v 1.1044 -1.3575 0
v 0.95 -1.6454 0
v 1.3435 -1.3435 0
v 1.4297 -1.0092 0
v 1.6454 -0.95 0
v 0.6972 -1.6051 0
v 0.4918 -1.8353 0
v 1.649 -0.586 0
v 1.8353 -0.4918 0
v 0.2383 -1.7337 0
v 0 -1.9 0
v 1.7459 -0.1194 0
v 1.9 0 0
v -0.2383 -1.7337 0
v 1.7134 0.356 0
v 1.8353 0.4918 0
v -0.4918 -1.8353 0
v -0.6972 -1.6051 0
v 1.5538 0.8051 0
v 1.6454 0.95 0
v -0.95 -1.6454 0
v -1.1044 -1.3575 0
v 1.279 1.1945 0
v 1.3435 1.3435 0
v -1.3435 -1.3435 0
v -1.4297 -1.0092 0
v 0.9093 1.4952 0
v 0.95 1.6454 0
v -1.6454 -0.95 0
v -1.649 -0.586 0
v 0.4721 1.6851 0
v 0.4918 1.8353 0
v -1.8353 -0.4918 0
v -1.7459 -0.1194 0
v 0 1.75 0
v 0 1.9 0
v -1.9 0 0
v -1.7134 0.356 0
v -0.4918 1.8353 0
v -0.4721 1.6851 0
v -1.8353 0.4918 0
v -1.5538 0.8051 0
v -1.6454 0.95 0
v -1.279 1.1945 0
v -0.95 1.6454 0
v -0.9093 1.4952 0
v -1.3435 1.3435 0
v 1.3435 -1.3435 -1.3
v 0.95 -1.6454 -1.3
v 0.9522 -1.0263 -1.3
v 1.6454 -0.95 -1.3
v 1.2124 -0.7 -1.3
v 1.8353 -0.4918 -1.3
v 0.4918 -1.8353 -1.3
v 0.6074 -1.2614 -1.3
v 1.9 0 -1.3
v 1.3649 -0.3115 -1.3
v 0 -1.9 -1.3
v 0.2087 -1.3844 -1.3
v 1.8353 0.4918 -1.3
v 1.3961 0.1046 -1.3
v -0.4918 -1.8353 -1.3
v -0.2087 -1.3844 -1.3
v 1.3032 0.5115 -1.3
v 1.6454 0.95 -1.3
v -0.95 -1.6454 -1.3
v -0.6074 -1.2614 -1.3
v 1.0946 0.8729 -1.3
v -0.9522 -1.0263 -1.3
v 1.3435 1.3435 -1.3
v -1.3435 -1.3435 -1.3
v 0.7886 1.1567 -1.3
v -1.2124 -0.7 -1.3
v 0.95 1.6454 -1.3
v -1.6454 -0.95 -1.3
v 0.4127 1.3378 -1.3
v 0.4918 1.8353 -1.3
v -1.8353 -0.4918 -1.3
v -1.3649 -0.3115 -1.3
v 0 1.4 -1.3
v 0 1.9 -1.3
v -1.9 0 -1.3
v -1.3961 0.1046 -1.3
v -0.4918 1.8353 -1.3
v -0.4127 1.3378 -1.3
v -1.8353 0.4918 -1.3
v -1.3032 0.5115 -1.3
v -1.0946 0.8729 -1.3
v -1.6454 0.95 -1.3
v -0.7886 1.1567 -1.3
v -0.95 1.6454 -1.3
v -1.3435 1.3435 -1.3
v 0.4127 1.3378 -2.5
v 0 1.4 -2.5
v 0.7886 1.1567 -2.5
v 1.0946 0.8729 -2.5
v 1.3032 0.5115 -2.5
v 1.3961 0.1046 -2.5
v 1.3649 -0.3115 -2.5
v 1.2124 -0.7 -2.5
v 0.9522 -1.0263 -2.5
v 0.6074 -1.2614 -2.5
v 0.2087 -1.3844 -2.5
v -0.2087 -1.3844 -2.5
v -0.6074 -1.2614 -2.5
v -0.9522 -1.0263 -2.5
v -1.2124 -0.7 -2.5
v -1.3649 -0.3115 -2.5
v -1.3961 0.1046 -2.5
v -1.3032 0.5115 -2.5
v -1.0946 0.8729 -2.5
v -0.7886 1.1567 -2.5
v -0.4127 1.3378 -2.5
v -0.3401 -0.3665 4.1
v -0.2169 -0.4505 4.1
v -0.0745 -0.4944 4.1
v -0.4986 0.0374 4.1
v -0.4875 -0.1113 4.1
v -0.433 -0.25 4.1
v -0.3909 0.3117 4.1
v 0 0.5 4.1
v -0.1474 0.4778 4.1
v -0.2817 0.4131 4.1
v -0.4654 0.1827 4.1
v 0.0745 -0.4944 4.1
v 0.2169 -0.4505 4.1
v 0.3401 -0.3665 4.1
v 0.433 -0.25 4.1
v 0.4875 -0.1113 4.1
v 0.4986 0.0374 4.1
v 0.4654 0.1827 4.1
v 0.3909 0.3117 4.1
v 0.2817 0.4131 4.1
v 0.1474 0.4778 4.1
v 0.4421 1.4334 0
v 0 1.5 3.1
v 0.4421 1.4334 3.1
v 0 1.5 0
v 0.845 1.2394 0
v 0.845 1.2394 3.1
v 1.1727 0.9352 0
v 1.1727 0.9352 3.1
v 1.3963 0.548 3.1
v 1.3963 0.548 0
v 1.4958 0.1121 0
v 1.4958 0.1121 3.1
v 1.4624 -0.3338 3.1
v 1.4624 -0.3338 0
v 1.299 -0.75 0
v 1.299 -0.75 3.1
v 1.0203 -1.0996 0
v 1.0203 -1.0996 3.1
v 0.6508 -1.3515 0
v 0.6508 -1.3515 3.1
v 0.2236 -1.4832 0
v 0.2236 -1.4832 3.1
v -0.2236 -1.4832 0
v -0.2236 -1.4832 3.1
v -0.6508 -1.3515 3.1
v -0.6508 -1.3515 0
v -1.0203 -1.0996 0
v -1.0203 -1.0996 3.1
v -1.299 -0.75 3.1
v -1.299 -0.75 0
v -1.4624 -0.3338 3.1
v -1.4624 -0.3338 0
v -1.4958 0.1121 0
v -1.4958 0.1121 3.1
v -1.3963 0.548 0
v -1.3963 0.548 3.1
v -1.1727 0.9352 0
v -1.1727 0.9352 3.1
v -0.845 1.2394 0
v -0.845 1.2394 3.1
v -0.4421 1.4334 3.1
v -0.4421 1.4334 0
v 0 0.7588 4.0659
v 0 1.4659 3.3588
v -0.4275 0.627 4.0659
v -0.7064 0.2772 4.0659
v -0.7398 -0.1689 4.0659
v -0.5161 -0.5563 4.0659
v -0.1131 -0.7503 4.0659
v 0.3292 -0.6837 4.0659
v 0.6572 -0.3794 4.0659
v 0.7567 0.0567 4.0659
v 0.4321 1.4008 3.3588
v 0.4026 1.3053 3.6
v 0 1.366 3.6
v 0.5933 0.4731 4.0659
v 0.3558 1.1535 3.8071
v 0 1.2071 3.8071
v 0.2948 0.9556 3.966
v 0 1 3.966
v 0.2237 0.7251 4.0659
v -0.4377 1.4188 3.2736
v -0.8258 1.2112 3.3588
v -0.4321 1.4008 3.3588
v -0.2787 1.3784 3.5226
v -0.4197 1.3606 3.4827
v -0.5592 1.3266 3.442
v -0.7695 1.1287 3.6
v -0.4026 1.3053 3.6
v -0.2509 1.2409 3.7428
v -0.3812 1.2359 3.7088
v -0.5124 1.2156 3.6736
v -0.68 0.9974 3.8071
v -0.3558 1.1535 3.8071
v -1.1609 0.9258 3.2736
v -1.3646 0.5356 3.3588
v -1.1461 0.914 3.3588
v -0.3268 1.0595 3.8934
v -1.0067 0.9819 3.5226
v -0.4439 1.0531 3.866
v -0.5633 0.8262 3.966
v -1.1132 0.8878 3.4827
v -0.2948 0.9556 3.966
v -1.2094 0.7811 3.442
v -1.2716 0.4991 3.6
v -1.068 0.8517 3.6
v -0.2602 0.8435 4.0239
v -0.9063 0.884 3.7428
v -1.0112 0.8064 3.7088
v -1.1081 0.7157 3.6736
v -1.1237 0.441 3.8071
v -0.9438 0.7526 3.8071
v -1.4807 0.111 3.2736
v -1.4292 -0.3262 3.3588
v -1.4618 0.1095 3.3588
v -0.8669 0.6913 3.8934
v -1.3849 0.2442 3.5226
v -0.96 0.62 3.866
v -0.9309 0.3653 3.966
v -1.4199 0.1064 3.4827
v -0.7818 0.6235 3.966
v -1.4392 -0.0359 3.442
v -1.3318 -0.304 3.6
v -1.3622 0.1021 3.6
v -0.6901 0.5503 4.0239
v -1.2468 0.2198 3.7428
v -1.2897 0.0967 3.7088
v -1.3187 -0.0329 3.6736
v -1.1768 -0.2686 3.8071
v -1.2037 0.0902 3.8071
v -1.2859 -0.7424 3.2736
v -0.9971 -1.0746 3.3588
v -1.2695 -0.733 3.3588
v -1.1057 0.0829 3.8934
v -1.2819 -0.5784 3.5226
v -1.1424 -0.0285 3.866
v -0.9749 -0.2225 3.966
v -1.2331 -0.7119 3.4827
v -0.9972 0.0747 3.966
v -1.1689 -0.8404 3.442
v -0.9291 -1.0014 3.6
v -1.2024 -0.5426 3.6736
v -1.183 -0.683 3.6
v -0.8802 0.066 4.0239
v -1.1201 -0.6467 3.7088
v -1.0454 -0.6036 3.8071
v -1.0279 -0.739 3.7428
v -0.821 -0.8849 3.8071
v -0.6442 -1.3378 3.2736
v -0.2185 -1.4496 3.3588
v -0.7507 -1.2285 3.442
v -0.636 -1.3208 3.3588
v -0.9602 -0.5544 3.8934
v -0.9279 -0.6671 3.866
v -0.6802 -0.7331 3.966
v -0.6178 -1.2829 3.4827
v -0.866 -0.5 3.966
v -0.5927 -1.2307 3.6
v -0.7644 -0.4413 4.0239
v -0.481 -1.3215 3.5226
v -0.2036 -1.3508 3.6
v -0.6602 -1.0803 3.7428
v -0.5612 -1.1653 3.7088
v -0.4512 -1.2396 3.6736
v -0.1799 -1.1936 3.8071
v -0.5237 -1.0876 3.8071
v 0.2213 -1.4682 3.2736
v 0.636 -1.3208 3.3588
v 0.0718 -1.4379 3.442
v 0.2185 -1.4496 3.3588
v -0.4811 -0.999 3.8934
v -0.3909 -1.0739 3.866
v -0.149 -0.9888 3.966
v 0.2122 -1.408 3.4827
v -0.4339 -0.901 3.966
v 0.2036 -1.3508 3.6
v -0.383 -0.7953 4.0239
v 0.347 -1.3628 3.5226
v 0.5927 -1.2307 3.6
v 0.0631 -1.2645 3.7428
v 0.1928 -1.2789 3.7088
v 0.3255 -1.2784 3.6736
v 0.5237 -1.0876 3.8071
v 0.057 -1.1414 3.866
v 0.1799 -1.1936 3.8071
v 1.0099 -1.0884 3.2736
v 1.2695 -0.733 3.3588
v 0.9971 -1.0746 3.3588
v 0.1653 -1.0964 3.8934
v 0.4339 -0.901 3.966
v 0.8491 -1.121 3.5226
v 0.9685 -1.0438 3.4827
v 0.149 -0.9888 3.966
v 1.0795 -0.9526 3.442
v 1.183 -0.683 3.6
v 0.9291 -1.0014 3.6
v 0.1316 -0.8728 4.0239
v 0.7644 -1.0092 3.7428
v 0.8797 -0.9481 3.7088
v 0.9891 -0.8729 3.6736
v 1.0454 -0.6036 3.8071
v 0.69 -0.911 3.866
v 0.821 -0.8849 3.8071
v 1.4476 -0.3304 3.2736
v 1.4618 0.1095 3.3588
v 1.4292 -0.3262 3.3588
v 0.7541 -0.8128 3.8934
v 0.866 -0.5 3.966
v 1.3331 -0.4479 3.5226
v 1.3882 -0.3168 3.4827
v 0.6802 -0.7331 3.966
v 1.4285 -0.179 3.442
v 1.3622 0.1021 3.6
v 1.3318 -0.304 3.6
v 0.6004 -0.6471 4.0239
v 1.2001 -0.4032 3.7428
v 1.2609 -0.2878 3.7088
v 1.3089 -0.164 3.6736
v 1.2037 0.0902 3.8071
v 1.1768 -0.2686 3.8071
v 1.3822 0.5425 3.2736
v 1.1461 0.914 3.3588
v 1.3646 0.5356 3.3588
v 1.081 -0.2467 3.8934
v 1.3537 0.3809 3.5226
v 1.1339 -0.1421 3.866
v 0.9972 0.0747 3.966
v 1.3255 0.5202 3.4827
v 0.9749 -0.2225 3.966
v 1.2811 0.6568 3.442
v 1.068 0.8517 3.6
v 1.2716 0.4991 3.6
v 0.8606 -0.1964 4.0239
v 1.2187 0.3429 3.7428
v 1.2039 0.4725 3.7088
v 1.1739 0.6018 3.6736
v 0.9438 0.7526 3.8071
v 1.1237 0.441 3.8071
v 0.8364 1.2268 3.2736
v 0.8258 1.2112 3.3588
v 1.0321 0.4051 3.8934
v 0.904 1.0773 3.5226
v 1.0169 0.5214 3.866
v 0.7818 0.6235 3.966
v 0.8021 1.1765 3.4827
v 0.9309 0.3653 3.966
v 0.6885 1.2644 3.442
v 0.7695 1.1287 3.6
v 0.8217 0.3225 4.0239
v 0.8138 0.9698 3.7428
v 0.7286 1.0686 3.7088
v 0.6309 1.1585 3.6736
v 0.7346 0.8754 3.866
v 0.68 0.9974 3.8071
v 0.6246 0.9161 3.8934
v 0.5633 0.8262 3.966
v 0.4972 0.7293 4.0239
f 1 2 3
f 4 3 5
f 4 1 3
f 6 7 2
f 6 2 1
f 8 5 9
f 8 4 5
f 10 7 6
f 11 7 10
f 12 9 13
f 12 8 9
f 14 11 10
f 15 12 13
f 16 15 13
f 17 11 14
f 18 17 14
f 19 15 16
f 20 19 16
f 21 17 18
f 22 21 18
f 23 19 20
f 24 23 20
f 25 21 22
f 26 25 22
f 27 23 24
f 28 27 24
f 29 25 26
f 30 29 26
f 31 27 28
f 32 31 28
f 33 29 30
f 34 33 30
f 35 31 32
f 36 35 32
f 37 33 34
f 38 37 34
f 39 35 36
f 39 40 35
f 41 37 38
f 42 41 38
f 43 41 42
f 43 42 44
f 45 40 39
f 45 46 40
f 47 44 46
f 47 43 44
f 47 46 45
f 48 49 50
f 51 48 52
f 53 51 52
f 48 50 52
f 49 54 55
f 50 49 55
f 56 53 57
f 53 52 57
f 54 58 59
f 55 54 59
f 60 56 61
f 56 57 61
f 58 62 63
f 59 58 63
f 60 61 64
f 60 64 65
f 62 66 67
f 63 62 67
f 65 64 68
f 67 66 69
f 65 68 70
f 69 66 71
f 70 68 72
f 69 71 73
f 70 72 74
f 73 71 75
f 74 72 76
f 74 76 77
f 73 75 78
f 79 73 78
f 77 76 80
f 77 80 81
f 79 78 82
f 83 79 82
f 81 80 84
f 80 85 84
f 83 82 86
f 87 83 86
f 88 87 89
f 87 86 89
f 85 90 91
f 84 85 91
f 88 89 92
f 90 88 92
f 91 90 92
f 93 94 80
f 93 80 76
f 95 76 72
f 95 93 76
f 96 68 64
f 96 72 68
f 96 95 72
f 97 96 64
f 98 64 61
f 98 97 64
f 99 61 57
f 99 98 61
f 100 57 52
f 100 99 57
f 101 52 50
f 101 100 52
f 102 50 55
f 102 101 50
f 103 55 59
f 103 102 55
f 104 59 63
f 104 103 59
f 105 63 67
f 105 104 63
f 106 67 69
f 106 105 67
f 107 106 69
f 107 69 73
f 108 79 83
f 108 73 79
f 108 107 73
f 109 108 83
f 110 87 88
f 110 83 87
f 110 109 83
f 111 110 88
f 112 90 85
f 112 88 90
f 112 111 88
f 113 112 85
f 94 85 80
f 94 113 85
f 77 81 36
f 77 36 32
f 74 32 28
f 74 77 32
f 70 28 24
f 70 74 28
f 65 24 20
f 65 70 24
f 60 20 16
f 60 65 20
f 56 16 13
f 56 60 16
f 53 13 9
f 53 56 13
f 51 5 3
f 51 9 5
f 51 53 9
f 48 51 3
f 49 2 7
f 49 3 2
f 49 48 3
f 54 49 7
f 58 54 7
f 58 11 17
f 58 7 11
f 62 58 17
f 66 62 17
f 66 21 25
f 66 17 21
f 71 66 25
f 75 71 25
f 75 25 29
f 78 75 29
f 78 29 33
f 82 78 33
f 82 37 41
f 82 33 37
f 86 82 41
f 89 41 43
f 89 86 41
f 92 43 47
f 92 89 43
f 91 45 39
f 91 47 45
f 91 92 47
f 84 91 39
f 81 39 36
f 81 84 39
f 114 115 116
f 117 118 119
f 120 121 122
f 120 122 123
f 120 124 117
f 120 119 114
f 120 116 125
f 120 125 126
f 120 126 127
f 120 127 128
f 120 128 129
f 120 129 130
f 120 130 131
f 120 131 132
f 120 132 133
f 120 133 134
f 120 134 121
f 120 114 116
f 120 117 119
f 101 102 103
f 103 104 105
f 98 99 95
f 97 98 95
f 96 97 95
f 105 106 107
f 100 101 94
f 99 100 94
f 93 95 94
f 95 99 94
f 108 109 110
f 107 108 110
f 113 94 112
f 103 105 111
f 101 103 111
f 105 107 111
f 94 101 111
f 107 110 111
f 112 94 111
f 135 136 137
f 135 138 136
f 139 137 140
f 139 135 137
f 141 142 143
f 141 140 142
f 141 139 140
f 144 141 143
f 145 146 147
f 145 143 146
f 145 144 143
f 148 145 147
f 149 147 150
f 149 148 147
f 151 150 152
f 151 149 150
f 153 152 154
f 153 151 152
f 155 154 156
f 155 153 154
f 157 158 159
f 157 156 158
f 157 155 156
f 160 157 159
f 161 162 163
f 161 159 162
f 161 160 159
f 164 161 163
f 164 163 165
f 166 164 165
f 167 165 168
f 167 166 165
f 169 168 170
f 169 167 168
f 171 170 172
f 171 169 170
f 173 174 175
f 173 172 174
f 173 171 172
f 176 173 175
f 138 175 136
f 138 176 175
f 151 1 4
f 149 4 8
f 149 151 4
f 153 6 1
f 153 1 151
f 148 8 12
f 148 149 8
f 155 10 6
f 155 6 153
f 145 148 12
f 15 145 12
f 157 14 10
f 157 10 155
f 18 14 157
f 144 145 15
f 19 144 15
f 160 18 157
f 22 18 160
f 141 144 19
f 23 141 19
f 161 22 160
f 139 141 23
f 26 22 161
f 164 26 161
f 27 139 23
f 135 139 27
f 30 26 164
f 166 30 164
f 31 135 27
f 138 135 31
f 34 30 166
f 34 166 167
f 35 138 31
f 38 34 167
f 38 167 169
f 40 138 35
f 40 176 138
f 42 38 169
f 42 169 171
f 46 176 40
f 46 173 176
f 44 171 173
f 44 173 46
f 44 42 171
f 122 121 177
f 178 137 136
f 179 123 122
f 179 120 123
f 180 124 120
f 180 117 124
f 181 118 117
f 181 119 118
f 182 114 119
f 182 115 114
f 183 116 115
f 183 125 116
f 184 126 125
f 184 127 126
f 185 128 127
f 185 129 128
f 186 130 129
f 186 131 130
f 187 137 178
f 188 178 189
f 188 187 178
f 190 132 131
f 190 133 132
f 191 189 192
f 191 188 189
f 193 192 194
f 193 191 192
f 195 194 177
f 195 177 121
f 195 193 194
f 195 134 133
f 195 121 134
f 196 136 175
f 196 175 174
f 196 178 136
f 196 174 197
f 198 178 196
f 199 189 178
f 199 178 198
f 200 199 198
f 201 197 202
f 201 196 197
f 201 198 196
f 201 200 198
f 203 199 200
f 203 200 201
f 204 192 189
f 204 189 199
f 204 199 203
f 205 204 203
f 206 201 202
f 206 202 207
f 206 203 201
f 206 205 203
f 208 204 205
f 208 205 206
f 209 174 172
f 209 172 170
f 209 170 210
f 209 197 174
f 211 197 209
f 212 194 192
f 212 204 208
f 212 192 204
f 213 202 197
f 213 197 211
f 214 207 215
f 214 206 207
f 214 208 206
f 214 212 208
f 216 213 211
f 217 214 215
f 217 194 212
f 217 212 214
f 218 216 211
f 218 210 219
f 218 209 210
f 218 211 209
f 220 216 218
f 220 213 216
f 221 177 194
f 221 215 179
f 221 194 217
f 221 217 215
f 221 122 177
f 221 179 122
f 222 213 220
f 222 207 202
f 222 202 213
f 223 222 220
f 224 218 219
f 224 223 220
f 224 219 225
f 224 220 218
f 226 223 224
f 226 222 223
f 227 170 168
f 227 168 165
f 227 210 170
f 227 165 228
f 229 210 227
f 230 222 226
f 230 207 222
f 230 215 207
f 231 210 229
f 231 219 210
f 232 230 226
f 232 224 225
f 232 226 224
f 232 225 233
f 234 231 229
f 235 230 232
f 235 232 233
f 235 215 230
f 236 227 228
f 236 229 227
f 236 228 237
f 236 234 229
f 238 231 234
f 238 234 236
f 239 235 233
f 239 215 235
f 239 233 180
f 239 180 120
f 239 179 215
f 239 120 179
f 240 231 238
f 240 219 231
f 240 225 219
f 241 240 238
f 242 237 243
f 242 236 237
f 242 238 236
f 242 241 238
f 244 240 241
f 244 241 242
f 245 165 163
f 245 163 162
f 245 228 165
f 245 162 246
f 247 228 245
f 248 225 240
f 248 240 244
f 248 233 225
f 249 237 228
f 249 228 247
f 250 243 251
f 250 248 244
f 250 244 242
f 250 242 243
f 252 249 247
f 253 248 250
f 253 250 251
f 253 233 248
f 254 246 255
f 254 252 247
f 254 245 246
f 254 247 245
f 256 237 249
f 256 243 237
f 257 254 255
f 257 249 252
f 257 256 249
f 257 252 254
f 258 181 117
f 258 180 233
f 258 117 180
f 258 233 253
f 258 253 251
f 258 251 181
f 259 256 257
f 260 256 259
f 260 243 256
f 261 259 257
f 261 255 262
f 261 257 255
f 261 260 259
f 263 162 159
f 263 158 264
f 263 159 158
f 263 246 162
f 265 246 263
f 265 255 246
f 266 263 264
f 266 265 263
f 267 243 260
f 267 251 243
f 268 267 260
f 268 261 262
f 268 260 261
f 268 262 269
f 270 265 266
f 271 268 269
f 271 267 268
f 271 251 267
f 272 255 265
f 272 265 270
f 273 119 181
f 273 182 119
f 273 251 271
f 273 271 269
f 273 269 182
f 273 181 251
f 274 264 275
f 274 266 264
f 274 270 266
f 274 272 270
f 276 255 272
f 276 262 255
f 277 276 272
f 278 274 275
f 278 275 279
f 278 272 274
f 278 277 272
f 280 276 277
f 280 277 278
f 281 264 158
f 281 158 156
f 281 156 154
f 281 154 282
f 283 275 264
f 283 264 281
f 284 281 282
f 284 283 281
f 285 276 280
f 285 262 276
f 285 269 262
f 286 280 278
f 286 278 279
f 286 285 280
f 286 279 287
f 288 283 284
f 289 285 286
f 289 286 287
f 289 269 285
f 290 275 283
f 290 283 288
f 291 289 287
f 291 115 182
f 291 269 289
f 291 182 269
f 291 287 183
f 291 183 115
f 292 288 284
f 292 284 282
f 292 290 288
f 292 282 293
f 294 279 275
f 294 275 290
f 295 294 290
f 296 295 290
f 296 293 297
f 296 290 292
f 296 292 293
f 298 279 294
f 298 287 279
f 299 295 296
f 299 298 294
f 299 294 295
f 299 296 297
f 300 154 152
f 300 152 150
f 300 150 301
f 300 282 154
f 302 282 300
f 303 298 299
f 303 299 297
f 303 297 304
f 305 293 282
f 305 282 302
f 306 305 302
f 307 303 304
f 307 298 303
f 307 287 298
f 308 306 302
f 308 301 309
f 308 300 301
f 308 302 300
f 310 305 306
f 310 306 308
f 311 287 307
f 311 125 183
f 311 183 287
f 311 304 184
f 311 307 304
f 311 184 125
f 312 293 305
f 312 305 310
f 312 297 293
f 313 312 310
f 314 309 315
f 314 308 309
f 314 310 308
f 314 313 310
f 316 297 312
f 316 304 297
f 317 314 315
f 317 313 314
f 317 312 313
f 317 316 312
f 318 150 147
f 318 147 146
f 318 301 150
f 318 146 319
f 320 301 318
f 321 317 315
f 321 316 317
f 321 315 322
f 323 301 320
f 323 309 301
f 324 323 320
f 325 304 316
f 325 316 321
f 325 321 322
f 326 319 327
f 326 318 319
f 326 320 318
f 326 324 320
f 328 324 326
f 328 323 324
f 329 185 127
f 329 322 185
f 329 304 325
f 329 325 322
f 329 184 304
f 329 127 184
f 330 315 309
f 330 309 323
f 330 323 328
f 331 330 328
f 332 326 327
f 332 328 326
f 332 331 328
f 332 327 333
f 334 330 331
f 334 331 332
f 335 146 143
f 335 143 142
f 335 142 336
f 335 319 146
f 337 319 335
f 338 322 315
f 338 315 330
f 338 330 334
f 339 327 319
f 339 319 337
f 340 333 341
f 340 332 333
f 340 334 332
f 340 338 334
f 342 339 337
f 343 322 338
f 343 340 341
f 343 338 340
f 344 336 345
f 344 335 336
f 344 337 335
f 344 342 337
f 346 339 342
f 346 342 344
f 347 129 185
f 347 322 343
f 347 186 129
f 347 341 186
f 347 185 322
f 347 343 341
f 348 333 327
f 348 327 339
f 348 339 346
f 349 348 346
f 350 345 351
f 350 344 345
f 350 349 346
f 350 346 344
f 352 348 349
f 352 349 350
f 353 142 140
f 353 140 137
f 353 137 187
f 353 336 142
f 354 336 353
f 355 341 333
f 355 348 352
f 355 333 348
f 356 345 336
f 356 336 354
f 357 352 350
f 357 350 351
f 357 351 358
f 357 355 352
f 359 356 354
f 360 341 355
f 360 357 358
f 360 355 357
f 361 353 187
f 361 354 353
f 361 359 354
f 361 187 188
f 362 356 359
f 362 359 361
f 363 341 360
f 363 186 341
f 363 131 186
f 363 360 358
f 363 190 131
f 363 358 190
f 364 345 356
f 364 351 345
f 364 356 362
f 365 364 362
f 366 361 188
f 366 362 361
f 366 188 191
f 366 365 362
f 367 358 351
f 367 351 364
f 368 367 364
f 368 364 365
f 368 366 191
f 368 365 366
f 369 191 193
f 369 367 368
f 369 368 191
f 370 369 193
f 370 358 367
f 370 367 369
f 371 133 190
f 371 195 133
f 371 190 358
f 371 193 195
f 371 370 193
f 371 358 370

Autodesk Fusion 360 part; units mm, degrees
sketch "drawing" plane through (0, 0, 0) normal (1, 0, 0) x (0, 1, 0)
  line L0 (0, 4.1) -> (0.5, 4.1)
  line L1 (1.5, 3.1) -> (1.5, 0)
  line L2 (0, 0) -> (0, 4.1)
  line L3 (1.75, 0) -> (22.5, 0)
  line L4 (0, 1.75) -> (0, 22.5)
  arc A0 (1.5, 3.1) -> (0.5, 4.1) centre (0.5, 3.1) ccw
  line L5 (1.5, 0) -> (1.9, 0)
  line L6 (1.9, 0) -> (1.9, -1.3)
  line L7 (1.9, -1.3) -> (1.4, -1.3)
  line L8 (0, -1.3) -> (0, 0)
  line L9 (20, 0) -> (2.5, 0)
  line L10 (1.4, -1.3) -> (1.4, -2.5)
  line L11 (1.4, -2.5) -> (0, -2.5)
  line L12 (0, -2.5) -> (0, -1.3)
  dimension "d1" = 1.5
  dimension "d3" = 1
  dimension "d4" = 1.9
  dimension "d5" = 1.3
  dimension "d6" = 4.1
  dimension "d7" = 1.4
  dimension "d8" = 2.5
revolve "Revolve1" add sketch "drawing" angle 360 about axis through (0, 0, 0) along (0, 0, 1)
